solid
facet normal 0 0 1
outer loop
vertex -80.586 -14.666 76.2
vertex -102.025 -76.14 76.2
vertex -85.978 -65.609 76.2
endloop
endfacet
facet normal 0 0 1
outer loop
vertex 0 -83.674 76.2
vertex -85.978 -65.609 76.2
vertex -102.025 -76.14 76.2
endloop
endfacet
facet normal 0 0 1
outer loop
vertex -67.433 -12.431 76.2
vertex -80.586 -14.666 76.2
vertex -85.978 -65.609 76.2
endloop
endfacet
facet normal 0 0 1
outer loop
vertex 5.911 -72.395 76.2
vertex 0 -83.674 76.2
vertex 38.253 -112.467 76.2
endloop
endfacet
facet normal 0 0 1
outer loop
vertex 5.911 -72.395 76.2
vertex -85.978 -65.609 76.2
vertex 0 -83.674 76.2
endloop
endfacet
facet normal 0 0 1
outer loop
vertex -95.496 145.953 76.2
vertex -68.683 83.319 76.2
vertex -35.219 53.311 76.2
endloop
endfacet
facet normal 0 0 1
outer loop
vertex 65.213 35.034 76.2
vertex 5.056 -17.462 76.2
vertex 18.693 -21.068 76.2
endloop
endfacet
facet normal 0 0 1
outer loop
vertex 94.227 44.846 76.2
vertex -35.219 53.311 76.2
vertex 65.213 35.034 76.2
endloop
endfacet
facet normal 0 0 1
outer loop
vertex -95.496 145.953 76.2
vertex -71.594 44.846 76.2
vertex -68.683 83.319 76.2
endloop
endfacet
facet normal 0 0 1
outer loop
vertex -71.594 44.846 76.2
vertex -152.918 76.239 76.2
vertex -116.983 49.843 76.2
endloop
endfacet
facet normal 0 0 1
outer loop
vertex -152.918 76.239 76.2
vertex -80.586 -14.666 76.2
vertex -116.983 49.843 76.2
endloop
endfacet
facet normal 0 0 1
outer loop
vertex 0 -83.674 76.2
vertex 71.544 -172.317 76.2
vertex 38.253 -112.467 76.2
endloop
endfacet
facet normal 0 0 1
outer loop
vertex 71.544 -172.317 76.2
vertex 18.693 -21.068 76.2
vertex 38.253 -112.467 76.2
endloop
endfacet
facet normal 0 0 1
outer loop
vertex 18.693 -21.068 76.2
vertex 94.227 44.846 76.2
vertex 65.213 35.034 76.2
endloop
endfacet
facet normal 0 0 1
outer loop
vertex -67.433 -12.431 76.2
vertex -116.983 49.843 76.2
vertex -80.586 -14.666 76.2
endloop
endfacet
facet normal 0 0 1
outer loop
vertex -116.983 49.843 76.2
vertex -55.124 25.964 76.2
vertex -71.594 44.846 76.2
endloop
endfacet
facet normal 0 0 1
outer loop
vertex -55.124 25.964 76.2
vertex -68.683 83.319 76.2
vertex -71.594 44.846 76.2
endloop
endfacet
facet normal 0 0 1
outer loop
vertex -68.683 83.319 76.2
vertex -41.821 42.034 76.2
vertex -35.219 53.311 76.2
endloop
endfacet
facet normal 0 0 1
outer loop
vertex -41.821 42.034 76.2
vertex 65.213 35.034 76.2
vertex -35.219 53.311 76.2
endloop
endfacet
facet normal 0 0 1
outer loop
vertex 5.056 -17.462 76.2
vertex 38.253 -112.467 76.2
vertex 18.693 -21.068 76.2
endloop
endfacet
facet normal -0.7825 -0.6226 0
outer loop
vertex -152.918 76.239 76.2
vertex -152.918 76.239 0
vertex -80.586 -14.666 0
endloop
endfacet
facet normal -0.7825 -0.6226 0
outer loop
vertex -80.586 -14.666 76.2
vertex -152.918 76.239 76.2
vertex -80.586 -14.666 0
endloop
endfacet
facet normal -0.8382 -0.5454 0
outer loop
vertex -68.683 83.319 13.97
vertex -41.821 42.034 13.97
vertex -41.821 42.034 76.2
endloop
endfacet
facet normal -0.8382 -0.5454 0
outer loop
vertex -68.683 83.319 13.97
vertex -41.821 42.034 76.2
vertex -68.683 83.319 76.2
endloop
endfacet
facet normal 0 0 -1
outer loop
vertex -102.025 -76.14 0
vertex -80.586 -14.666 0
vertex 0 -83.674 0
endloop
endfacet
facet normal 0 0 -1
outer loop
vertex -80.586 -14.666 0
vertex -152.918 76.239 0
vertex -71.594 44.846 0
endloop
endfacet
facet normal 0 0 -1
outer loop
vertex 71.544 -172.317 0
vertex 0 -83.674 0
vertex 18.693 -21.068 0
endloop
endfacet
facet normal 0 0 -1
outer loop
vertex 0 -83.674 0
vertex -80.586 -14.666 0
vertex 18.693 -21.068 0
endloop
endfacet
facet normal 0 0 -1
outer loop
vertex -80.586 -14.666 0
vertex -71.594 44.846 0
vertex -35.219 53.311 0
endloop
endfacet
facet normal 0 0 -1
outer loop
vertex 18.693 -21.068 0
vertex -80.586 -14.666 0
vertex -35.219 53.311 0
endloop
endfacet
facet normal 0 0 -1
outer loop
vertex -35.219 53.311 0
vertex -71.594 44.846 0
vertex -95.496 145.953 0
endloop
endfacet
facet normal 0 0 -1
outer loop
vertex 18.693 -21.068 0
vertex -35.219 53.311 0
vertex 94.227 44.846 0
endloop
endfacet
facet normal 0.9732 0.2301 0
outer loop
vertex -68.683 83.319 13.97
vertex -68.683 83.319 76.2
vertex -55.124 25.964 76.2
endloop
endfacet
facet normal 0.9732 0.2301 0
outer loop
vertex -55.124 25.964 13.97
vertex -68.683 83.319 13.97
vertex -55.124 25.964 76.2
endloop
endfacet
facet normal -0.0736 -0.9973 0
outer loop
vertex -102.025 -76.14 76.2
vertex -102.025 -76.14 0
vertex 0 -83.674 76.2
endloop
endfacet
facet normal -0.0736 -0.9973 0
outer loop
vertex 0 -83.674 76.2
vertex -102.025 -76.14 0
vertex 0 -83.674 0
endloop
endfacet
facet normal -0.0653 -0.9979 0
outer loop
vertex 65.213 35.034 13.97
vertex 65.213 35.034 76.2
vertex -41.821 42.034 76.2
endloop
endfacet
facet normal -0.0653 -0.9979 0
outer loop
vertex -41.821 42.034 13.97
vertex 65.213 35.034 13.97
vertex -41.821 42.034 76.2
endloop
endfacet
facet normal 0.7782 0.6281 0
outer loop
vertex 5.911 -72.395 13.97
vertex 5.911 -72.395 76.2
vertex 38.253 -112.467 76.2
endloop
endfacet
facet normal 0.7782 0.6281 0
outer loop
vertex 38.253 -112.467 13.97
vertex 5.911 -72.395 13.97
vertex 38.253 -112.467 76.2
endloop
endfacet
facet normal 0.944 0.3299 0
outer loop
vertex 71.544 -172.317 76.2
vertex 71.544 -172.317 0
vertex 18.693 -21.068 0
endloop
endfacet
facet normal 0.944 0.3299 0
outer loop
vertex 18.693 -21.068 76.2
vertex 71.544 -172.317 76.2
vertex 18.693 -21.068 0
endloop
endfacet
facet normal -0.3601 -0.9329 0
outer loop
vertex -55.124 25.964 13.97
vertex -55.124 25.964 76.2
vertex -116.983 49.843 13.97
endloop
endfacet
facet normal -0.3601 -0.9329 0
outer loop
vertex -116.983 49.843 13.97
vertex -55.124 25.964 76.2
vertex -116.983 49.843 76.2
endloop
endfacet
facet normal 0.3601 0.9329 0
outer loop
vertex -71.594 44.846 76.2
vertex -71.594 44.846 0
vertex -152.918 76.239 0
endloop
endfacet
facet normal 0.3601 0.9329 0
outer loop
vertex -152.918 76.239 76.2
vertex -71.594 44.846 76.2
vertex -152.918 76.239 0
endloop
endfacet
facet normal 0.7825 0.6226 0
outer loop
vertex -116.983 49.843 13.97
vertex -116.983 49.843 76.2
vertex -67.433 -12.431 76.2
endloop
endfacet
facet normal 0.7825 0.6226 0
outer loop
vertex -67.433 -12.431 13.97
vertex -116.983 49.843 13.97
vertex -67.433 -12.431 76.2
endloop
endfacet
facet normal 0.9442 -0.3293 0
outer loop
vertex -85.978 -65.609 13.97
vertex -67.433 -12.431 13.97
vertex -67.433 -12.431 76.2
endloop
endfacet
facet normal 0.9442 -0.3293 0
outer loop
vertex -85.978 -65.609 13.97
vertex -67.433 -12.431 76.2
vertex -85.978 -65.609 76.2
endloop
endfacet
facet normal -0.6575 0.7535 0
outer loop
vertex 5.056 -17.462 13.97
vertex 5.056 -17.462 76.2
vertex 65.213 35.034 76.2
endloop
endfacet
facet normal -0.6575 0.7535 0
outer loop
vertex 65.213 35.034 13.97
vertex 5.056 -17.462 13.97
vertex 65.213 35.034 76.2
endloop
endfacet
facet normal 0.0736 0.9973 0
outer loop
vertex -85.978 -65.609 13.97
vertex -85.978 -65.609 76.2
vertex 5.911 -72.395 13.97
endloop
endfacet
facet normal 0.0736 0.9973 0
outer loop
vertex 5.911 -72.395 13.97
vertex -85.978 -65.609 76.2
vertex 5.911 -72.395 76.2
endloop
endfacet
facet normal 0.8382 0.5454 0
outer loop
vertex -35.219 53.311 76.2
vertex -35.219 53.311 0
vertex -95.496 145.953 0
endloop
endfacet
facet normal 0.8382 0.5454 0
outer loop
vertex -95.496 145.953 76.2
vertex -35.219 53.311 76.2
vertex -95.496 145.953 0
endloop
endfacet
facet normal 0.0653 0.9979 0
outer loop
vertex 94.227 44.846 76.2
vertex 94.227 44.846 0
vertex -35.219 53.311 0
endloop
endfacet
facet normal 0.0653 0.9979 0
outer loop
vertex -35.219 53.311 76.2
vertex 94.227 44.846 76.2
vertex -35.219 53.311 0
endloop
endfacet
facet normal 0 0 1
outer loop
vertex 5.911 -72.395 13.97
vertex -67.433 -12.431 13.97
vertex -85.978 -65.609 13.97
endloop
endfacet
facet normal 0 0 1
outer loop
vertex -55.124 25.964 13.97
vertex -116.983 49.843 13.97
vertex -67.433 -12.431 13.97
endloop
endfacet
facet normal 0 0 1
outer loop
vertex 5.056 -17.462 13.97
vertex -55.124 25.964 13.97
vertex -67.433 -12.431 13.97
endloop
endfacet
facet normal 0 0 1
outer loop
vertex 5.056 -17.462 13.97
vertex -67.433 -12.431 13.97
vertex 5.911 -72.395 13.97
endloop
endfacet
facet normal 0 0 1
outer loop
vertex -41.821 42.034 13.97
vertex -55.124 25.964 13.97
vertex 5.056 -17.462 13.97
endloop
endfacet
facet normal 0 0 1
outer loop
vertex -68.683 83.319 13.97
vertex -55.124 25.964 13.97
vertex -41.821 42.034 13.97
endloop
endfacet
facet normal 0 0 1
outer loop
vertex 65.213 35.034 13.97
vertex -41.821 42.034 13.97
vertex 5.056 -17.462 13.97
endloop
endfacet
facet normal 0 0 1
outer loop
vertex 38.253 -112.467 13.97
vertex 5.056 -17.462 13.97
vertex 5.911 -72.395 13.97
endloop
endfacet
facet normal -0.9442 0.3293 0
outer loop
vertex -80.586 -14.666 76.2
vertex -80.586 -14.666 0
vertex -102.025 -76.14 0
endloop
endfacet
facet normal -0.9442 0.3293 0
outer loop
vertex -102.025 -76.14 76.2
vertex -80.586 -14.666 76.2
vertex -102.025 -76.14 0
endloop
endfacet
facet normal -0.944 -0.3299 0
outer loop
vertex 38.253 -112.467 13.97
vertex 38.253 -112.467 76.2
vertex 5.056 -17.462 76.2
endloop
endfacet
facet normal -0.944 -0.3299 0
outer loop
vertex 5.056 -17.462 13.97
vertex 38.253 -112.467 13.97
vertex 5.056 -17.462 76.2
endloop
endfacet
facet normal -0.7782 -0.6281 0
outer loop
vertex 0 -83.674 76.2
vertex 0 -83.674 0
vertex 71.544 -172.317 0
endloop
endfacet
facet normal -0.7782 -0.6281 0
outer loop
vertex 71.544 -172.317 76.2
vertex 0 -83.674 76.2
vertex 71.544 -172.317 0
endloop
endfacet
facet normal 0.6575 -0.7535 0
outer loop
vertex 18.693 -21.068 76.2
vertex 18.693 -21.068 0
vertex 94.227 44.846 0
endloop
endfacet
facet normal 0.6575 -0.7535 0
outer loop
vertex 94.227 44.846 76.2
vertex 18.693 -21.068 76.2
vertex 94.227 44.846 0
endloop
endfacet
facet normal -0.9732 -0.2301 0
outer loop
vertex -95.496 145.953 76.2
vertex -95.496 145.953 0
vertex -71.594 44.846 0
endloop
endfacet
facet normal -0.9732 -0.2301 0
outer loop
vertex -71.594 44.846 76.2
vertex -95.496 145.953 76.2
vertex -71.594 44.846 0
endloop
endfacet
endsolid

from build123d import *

# Parameters (mm, degrees)
F1_DEPTH = 76.2
F3_DEPTH = 62.23


with BuildPart() as f1:
    # F0 (on Top) → F1 (new body)
    with BuildSketch(Plane.XY):
        Polygon((94.227217, 44.845942), (-35.218999, 53.311478), (-95.495798, 145.953357), (-71.593605, 44.845942), (-152.917683, 76.2394), (-80.585986, -14.665665), (-102.024987, -76.140255), (0, -83.673872), (71.544036, -172.317266), (18.6927, -21.068443), align=None)
    extrude(amount=F1_DEPTH)

    # F2 (on face) → F3 (cut)
    with BuildSketch(Plane.XY.offset(76.2)):
        Polygon((5.911248, -72.394553), (38.253499, -112.466753), (5.055551, -17.461575), (65.213298, 35.034437), (-41.821007, 42.034277), (-68.682796, 83.319259), (-55.123725, 25.963743), (-116.983429, 49.843387), (-67.43257, -12.431166), (-85.978236, -65.60935), align=None)
    extrude(amount=-F3_DEPTH, mode=Mode.SUBTRACT)


solid = f1.part
